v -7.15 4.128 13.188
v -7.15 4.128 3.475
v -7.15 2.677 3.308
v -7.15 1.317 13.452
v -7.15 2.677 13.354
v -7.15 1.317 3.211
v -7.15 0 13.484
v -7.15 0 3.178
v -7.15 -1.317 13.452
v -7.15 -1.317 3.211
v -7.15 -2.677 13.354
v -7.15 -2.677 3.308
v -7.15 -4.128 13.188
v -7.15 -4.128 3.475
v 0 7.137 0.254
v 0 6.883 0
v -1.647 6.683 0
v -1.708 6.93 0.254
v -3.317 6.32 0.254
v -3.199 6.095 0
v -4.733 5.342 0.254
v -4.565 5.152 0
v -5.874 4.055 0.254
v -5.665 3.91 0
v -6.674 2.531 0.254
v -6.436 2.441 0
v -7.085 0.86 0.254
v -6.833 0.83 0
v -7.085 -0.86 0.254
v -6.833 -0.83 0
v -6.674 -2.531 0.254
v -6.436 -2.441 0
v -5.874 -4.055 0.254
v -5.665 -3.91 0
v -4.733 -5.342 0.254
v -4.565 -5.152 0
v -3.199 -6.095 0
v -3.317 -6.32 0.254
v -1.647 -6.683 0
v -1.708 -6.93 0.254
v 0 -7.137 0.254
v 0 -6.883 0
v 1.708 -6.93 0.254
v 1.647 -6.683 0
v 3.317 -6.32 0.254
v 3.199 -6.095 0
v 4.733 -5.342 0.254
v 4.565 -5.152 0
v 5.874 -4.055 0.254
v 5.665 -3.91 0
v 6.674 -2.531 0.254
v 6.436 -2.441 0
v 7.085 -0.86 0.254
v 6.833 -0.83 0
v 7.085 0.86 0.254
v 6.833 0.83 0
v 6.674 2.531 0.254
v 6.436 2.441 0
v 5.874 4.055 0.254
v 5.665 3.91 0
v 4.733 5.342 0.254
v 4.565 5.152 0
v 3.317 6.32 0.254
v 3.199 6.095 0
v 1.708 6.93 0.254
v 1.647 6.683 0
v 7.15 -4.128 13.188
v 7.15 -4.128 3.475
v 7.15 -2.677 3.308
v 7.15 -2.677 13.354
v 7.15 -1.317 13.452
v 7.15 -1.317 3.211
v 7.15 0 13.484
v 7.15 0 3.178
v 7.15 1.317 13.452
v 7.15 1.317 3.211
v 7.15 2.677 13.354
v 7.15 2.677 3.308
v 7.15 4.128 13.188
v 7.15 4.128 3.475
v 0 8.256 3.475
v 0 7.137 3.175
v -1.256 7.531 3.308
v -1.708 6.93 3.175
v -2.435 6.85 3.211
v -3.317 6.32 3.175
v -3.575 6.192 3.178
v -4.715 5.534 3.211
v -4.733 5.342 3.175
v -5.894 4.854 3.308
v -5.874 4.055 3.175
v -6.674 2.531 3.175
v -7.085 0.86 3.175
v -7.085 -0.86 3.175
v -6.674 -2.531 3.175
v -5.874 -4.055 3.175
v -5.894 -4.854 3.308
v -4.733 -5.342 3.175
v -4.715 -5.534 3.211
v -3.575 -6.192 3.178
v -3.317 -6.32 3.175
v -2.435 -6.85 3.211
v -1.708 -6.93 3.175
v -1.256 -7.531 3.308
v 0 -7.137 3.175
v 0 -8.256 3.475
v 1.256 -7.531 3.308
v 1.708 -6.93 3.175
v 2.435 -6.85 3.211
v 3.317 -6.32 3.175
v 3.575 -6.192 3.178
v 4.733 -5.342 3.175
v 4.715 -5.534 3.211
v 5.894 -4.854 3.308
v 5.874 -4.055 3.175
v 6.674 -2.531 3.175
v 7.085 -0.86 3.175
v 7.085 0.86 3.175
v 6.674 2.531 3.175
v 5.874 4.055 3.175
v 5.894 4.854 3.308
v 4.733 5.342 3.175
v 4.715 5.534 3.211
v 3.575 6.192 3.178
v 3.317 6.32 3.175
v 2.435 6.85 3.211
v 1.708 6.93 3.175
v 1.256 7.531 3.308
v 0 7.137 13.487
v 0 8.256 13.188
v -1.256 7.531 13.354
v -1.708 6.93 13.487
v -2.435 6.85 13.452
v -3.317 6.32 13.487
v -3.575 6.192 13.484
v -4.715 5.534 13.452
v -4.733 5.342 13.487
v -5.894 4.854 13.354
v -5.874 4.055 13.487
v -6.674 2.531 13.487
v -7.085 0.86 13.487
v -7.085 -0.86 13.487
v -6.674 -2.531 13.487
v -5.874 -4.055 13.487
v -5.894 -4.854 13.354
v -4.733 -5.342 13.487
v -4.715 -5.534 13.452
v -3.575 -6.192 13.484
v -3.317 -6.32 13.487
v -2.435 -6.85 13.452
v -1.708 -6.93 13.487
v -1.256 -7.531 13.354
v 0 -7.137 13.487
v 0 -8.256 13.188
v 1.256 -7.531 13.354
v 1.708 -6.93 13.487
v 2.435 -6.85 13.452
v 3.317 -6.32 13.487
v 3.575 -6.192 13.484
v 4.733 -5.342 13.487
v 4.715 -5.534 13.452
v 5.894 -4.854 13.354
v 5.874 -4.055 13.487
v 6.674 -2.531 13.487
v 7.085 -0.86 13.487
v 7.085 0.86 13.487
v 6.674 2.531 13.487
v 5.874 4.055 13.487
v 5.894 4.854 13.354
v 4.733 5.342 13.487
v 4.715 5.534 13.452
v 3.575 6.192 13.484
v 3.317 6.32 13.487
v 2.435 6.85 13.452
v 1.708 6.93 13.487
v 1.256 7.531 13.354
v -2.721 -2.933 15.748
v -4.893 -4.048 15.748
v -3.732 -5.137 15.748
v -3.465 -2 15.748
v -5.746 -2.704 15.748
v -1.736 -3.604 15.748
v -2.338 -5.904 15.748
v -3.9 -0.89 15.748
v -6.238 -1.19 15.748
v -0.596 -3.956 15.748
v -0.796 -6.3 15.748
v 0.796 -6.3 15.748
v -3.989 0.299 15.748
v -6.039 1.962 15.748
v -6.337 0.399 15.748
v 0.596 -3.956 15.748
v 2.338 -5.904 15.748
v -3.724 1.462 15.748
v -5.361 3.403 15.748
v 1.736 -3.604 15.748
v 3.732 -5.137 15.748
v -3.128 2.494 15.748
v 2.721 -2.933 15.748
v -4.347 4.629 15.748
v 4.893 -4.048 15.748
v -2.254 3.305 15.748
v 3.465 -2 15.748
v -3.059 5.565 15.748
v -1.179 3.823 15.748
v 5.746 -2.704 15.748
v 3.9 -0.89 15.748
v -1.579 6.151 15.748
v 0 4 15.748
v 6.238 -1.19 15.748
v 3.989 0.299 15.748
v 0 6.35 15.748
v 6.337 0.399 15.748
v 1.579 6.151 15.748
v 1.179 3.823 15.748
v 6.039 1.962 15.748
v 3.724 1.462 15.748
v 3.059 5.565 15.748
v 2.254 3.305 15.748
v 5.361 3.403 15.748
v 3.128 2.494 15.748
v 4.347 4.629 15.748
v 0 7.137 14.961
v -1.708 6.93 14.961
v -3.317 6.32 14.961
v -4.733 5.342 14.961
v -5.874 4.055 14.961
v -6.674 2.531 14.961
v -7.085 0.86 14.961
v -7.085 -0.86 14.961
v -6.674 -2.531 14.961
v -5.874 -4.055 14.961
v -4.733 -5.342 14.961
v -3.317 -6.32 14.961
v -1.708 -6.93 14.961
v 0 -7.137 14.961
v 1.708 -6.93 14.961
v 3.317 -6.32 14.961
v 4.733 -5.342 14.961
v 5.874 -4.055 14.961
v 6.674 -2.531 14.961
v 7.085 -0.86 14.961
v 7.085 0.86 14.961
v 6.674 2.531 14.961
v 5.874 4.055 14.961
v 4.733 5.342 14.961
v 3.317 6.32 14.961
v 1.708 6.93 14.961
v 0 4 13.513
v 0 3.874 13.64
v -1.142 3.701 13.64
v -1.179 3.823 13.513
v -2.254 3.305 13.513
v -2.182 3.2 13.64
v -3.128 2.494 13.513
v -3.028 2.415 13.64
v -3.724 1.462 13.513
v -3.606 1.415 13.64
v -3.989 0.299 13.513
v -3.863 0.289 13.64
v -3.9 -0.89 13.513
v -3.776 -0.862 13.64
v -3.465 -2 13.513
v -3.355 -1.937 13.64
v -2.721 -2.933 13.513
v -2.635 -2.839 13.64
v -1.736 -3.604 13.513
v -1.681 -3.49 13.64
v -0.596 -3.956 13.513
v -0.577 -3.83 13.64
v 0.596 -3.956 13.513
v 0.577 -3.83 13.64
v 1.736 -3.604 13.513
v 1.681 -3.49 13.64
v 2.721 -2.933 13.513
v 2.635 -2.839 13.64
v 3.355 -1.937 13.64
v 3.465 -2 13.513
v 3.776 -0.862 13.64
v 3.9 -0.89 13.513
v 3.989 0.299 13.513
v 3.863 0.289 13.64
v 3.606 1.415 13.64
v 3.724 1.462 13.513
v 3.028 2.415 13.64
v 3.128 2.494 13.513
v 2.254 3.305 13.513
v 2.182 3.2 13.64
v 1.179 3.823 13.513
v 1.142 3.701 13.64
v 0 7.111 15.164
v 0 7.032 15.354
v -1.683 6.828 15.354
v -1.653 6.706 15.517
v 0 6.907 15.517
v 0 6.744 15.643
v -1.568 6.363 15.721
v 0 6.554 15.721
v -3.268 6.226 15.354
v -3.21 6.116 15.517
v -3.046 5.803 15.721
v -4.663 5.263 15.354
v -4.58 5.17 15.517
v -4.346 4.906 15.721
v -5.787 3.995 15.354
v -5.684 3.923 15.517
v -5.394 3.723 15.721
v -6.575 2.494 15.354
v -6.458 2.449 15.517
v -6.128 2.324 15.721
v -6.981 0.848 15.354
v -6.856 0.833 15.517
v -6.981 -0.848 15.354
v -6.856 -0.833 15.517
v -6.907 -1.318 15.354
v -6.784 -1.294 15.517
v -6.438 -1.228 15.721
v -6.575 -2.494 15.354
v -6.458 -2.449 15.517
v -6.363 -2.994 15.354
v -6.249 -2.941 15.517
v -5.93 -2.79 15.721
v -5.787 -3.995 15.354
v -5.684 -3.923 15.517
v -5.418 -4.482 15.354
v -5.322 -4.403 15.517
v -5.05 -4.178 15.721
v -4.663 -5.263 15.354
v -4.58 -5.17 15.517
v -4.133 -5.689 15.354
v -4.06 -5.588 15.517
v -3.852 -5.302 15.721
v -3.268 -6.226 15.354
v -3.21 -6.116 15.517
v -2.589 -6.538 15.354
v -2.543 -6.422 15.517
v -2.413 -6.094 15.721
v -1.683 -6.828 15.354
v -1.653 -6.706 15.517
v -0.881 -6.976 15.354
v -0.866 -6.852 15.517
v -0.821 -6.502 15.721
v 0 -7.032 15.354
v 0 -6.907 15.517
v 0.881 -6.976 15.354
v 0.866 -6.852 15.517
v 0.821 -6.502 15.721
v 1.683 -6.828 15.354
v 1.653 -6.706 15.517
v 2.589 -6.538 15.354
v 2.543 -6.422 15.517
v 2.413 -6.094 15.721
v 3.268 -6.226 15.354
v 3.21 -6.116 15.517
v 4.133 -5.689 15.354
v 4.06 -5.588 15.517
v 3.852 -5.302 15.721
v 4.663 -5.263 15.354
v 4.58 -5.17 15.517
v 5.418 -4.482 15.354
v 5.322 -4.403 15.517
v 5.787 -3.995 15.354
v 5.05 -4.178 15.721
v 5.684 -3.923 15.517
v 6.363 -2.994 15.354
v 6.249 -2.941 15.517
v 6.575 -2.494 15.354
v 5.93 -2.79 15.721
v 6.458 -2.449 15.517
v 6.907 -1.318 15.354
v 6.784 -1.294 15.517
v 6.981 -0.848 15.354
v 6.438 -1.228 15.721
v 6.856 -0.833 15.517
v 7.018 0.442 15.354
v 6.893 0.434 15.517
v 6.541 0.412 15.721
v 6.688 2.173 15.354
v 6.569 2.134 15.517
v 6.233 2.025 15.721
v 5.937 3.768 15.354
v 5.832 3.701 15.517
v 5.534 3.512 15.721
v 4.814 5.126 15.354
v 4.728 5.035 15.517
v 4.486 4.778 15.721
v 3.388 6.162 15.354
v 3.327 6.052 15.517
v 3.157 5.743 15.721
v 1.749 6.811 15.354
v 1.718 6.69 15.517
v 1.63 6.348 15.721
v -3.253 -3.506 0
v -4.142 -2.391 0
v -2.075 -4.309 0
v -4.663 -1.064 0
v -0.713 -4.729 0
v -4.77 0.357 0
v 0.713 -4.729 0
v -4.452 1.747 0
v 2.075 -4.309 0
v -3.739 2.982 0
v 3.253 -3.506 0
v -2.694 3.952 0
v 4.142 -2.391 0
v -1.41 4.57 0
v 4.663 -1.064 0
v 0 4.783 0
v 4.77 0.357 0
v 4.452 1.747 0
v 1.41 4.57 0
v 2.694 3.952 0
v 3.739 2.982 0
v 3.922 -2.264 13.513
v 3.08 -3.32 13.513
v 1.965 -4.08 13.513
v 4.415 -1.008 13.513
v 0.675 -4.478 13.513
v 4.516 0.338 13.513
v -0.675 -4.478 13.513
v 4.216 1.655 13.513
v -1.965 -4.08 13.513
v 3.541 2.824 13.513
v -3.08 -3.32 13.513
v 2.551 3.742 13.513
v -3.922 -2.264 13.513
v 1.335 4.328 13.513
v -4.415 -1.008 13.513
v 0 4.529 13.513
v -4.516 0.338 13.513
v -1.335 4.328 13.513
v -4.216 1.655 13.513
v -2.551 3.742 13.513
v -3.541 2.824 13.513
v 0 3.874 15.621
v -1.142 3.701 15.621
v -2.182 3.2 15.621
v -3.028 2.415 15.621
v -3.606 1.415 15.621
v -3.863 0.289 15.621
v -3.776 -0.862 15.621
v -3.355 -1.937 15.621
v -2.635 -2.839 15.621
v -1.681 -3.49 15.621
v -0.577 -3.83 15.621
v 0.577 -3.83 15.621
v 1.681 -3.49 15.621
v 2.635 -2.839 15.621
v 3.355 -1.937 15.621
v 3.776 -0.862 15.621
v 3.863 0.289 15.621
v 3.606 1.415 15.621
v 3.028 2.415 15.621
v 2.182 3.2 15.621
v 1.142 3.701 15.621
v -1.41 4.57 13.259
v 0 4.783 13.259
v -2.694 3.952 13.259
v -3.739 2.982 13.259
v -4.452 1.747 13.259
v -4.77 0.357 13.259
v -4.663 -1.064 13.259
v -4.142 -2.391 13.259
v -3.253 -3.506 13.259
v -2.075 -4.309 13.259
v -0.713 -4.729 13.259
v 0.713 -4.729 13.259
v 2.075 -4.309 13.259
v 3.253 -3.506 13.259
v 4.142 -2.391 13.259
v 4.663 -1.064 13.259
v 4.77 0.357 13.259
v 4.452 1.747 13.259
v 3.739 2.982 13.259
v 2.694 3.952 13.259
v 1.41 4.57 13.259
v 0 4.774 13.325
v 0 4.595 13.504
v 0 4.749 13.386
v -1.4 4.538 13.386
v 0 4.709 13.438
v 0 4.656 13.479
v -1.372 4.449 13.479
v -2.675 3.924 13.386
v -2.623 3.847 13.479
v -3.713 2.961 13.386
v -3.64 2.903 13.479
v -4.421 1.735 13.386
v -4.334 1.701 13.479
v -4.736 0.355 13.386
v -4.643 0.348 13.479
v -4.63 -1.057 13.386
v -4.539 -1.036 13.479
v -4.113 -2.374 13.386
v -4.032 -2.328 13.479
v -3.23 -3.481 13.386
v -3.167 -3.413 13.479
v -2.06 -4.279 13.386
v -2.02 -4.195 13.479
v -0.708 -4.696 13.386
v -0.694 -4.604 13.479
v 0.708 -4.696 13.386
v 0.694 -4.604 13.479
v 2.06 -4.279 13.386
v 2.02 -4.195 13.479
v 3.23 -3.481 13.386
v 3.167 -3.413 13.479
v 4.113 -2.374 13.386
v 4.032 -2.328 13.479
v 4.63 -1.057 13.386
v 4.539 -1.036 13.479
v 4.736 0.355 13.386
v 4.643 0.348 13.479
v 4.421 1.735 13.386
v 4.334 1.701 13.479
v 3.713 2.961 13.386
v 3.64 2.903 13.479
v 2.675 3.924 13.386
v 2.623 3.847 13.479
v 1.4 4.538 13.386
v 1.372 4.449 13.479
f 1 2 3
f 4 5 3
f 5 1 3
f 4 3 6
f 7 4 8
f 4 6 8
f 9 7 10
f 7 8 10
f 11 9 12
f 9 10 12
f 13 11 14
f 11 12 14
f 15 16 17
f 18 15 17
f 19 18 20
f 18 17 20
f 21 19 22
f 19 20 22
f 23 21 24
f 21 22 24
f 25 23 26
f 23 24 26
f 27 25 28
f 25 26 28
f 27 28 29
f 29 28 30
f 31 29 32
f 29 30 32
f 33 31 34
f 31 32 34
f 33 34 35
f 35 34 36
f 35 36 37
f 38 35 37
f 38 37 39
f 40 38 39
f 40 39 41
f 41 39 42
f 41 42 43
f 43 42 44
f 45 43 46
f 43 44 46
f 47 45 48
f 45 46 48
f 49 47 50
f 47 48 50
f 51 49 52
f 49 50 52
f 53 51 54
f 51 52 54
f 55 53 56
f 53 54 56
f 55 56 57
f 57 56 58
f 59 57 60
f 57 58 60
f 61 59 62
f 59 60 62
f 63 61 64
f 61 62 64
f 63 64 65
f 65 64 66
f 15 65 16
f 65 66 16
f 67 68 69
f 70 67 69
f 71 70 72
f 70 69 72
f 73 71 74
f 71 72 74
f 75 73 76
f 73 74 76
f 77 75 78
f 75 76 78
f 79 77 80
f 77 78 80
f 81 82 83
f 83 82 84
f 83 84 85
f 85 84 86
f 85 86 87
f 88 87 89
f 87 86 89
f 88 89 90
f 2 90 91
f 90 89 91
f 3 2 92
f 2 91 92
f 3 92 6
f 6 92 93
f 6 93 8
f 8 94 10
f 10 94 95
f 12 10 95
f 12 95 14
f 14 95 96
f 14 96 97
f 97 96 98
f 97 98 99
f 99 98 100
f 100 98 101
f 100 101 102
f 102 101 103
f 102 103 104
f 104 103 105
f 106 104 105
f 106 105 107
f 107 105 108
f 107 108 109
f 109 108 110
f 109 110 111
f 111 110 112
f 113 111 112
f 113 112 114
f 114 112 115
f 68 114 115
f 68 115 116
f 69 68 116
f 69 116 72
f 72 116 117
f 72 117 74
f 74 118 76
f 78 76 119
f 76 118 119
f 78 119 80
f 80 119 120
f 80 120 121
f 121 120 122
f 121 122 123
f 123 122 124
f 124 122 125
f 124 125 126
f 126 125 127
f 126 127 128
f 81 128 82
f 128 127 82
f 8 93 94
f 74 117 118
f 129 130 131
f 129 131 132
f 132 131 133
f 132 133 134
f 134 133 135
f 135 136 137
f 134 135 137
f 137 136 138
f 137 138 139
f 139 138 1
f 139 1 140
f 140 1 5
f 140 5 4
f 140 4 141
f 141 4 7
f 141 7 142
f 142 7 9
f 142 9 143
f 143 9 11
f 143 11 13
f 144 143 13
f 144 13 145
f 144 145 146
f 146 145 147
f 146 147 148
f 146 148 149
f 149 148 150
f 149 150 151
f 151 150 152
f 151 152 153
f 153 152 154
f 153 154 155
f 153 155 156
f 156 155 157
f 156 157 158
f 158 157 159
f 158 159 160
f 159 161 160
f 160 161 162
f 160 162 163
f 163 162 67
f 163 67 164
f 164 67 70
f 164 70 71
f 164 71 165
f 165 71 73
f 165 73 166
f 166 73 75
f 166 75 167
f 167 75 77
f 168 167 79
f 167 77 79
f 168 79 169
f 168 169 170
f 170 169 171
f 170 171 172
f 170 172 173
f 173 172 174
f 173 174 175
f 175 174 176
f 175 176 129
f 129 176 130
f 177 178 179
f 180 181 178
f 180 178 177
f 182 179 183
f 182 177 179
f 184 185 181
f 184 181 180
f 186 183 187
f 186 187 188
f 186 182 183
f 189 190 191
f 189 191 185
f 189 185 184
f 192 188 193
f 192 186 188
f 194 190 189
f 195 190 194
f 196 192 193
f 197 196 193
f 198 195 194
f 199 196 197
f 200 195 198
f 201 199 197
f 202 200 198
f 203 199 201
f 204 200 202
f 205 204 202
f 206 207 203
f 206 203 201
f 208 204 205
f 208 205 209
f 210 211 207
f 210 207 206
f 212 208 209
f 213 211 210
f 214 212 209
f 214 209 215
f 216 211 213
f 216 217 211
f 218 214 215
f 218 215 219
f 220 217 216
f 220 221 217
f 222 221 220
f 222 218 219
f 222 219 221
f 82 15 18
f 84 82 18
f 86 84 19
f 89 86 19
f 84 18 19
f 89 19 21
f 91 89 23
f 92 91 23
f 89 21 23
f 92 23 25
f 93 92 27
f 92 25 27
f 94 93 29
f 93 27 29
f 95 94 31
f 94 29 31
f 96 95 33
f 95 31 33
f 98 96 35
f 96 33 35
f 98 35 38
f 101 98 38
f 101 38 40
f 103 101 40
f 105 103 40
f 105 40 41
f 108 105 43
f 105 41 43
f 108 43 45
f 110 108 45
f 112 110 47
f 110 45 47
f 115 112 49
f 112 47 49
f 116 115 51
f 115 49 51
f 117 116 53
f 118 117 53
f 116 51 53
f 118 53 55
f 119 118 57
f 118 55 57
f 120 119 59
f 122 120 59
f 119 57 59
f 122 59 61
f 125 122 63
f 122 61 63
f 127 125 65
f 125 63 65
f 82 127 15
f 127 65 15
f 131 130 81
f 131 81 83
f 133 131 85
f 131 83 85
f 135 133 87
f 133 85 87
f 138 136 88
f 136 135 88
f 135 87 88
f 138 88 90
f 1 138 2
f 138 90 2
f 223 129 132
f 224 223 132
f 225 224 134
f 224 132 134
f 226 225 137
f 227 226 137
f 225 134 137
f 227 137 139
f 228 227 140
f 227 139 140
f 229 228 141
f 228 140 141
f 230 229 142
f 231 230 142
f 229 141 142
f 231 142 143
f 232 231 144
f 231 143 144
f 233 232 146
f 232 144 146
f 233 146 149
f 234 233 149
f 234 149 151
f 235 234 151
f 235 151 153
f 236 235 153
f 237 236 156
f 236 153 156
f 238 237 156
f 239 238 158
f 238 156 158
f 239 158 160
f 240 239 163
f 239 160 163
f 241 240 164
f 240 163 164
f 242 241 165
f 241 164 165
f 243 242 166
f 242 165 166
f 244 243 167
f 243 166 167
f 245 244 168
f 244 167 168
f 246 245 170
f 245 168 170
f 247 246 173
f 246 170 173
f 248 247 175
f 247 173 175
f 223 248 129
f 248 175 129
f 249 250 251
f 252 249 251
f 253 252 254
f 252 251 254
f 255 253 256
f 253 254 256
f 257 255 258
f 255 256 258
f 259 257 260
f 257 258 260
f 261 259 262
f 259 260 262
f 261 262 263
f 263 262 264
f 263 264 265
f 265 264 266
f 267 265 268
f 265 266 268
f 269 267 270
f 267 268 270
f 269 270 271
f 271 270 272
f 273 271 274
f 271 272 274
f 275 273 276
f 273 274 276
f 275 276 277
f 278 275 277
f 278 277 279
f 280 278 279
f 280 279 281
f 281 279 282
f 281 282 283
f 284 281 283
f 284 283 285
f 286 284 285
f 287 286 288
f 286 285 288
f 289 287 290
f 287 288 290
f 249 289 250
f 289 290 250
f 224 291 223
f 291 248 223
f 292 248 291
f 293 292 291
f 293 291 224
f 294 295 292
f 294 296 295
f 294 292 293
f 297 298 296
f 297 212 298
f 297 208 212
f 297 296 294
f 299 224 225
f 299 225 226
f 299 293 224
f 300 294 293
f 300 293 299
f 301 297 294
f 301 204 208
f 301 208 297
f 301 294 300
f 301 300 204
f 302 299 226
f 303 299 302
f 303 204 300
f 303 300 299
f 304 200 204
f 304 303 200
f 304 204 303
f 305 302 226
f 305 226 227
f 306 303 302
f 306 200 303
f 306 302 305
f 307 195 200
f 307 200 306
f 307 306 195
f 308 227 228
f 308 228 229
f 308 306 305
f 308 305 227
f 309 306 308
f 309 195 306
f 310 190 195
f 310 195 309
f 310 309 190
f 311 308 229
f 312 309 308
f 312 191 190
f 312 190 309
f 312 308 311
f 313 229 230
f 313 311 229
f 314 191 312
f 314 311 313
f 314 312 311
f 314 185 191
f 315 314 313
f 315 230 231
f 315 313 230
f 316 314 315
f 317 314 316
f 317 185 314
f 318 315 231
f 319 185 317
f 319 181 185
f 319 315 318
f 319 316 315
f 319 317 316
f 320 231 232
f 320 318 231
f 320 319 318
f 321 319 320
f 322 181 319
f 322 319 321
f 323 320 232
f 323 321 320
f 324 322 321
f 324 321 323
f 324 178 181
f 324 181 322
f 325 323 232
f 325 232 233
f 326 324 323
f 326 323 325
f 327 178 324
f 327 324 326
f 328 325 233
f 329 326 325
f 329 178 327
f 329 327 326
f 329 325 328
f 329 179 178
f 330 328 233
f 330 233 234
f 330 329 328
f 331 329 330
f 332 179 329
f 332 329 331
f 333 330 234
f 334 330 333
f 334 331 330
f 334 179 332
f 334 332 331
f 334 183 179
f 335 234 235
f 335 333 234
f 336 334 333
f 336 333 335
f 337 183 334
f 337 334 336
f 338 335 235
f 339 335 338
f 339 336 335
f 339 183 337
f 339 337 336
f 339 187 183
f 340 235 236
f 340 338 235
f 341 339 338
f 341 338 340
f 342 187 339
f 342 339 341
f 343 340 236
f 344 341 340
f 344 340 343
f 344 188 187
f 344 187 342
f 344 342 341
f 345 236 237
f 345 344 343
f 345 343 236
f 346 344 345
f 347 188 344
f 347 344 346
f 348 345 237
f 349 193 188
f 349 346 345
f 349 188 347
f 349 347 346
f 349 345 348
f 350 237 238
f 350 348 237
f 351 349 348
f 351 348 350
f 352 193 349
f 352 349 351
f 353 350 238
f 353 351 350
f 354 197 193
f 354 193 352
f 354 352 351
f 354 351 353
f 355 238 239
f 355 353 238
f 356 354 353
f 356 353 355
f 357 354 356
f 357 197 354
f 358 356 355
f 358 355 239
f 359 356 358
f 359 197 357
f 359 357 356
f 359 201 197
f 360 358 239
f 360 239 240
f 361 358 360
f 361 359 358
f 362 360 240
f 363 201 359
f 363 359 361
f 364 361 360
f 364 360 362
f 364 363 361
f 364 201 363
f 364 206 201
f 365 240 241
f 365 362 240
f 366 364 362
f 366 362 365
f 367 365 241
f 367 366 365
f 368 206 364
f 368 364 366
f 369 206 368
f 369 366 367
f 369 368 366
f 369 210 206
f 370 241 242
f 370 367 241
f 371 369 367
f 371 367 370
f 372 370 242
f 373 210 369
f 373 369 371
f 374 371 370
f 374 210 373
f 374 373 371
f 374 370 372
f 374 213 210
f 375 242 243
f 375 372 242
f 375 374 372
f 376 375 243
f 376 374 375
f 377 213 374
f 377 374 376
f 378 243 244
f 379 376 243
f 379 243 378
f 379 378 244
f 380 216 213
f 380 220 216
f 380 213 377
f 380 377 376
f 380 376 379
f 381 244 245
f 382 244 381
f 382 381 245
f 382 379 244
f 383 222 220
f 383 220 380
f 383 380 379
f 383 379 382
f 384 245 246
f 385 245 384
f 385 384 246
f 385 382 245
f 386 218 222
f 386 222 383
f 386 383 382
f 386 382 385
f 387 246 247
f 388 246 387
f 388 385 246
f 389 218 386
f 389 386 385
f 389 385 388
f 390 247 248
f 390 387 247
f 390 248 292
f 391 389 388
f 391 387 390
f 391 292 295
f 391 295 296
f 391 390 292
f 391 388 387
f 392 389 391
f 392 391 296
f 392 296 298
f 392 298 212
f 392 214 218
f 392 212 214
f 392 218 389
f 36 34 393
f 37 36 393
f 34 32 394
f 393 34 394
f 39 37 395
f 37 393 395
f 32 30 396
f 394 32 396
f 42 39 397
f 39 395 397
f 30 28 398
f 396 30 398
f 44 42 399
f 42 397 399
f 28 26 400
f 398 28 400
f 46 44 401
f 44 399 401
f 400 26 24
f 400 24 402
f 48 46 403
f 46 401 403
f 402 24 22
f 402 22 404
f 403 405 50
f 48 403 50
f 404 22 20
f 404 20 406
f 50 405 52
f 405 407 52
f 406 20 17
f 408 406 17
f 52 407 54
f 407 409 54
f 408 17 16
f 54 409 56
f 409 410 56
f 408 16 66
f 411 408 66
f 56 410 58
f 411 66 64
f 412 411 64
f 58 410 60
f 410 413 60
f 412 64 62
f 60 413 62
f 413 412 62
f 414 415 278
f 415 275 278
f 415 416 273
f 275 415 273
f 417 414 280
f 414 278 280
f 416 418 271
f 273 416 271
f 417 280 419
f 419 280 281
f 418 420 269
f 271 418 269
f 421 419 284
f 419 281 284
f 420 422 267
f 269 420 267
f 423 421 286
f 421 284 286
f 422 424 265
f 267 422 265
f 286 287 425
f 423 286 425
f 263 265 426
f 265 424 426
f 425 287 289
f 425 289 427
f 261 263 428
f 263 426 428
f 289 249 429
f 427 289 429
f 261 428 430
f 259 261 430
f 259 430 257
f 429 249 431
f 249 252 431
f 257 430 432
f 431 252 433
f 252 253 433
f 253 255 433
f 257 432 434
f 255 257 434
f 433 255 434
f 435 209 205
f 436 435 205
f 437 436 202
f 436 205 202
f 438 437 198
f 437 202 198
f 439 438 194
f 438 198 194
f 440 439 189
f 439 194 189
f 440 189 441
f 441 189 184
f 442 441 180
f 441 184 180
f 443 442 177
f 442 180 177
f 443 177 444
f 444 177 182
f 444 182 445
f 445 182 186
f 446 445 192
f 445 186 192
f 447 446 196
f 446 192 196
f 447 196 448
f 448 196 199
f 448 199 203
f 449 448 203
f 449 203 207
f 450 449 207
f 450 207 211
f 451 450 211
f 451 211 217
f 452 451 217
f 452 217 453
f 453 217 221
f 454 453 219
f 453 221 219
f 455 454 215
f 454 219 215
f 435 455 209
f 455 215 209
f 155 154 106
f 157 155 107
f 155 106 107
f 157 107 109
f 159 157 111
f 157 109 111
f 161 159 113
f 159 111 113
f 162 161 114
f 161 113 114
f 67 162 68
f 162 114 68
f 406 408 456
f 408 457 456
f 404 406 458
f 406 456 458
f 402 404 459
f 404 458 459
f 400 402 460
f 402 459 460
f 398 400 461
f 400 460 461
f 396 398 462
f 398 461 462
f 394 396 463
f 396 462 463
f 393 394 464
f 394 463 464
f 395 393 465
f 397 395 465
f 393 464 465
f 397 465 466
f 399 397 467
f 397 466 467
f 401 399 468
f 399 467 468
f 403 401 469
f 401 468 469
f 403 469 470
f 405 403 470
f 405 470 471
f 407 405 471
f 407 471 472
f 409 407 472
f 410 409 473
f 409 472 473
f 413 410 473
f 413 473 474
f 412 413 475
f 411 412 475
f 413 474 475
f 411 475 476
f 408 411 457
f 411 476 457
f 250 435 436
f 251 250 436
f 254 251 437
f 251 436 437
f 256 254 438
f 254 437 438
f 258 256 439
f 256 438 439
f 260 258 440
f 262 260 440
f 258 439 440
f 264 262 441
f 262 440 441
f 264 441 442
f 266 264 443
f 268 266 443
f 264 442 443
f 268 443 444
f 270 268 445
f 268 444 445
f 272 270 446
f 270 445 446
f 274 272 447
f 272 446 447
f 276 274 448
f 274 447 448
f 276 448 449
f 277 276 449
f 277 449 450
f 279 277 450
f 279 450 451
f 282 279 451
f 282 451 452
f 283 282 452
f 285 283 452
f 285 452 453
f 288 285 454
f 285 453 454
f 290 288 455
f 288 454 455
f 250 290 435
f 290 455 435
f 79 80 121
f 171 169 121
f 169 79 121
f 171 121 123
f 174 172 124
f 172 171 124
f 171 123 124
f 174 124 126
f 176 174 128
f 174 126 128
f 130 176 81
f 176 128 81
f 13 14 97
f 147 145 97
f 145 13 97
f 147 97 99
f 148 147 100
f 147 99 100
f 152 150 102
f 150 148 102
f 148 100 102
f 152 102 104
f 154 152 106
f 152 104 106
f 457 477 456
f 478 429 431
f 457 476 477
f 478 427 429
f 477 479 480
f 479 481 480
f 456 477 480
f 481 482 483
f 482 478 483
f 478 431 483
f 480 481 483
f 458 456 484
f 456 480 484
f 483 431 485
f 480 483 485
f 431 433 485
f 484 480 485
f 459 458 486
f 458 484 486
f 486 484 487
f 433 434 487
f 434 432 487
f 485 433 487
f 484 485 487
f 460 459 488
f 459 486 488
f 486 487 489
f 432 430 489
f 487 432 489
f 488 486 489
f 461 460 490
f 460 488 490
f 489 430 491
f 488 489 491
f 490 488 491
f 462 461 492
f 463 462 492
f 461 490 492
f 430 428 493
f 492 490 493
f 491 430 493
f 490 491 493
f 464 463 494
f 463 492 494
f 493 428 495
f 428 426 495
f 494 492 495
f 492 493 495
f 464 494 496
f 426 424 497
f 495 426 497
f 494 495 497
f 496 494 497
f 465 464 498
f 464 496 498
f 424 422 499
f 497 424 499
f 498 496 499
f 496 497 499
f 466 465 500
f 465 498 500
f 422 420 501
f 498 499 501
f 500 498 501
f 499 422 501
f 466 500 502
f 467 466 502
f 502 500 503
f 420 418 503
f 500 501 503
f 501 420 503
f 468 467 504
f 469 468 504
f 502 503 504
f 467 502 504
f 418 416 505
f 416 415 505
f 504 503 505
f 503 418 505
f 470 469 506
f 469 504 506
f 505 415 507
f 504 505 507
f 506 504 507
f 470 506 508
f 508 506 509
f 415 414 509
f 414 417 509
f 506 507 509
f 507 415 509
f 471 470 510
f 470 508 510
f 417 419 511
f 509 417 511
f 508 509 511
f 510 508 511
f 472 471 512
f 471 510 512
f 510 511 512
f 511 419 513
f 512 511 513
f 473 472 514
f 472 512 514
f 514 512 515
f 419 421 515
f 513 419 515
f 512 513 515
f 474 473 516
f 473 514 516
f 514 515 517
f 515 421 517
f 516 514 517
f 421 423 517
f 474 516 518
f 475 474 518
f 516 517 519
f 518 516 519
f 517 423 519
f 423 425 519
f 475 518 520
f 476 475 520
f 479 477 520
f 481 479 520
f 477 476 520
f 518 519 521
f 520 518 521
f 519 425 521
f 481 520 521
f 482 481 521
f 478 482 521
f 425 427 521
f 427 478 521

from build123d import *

# Parameters (mm, degrees)
BOSS_EXTRUDE1_DEPTH = 15.748
FILLET1_R           = 0.7874
CHAMFER1_SIZE       = 0.254
CHAMFER2_SIZE       = 0.127


with BuildPart() as part:
    # Sketch1 → Boss-Extrude1 (new body)
    with BuildSketch(Plane.XY):
        Polygon((0, 8.256224319), (-7.1501, 4.12811216), (-7.1501, -4.12811216), (0, -8.256224319), (7.1501, -4.12811216), (7.1501, 4.12811216), align=None)
    extrude(amount=BOSS_EXTRUDE1_DEPTH)

    # Sketch2 → Cut-Revolve1 (revolve, cut)
    with BuildSketch(Plane(origin=(0, 0, 0), x_dir=(0, 0, -1), z_dir=(1, 0, 0))):
        Polygon((-15.748, 9.375048639), (-15.748, 7.1374), (-13.4874, 7.1374), (-13.187611927, 8.256224319), (-3.474788073, 8.256224319), (-3.175, 7.1374), (0, 7.1374), (0, 9.375048639), align=None)
        with BuildLine():
            Line((-15.748, 3.8735), (-15.748, 0))
            Line((-15.748, 0), (0, 0))
            Line((0, 0), (0, 4.782916378))
            Line((0, 4.782916378), (-13.2588, 4.782916378))
            ThreePointArc((-13.2588, 4.782916378), (-13.438405122, 4.7085215), (-13.5128, 4.528916378))
            Line((-13.5128, 4.528916378), (-13.5128, 3.8735))
            Line((-13.5128, 3.8735), (-15.748, 3.8735))
        make_face()
    revolve(axis=Axis((0, 0, 0), (0, 0, 1)), mode=Mode.SUBTRACT)

    # Fillet1
    fillet1_edges = [part.edges().sort_by_distance(p)[0] for p in [
        (0, -7.1374, 15.748),
    ]]
    fillet(fillet1_edges, radius=FILLET1_R)

    # Chamfer1
    chamfer1_edges = [part.edges().sort_by_distance(p)[0] for p in [
        (0, -7.1374, 0),
    ]]
    chamfer(chamfer1_edges, length=CHAMFER1_SIZE)

    # Chamfer2
    chamfer2_edges = [part.edges().sort_by_distance(p)[0] for p in [
        (0, -3.8735, 15.748),
        (0, -3.8735, 13.5128),
    ]]
    chamfer(chamfer2_edges, length=CHAMFER2_SIZE)


solid = part.part
